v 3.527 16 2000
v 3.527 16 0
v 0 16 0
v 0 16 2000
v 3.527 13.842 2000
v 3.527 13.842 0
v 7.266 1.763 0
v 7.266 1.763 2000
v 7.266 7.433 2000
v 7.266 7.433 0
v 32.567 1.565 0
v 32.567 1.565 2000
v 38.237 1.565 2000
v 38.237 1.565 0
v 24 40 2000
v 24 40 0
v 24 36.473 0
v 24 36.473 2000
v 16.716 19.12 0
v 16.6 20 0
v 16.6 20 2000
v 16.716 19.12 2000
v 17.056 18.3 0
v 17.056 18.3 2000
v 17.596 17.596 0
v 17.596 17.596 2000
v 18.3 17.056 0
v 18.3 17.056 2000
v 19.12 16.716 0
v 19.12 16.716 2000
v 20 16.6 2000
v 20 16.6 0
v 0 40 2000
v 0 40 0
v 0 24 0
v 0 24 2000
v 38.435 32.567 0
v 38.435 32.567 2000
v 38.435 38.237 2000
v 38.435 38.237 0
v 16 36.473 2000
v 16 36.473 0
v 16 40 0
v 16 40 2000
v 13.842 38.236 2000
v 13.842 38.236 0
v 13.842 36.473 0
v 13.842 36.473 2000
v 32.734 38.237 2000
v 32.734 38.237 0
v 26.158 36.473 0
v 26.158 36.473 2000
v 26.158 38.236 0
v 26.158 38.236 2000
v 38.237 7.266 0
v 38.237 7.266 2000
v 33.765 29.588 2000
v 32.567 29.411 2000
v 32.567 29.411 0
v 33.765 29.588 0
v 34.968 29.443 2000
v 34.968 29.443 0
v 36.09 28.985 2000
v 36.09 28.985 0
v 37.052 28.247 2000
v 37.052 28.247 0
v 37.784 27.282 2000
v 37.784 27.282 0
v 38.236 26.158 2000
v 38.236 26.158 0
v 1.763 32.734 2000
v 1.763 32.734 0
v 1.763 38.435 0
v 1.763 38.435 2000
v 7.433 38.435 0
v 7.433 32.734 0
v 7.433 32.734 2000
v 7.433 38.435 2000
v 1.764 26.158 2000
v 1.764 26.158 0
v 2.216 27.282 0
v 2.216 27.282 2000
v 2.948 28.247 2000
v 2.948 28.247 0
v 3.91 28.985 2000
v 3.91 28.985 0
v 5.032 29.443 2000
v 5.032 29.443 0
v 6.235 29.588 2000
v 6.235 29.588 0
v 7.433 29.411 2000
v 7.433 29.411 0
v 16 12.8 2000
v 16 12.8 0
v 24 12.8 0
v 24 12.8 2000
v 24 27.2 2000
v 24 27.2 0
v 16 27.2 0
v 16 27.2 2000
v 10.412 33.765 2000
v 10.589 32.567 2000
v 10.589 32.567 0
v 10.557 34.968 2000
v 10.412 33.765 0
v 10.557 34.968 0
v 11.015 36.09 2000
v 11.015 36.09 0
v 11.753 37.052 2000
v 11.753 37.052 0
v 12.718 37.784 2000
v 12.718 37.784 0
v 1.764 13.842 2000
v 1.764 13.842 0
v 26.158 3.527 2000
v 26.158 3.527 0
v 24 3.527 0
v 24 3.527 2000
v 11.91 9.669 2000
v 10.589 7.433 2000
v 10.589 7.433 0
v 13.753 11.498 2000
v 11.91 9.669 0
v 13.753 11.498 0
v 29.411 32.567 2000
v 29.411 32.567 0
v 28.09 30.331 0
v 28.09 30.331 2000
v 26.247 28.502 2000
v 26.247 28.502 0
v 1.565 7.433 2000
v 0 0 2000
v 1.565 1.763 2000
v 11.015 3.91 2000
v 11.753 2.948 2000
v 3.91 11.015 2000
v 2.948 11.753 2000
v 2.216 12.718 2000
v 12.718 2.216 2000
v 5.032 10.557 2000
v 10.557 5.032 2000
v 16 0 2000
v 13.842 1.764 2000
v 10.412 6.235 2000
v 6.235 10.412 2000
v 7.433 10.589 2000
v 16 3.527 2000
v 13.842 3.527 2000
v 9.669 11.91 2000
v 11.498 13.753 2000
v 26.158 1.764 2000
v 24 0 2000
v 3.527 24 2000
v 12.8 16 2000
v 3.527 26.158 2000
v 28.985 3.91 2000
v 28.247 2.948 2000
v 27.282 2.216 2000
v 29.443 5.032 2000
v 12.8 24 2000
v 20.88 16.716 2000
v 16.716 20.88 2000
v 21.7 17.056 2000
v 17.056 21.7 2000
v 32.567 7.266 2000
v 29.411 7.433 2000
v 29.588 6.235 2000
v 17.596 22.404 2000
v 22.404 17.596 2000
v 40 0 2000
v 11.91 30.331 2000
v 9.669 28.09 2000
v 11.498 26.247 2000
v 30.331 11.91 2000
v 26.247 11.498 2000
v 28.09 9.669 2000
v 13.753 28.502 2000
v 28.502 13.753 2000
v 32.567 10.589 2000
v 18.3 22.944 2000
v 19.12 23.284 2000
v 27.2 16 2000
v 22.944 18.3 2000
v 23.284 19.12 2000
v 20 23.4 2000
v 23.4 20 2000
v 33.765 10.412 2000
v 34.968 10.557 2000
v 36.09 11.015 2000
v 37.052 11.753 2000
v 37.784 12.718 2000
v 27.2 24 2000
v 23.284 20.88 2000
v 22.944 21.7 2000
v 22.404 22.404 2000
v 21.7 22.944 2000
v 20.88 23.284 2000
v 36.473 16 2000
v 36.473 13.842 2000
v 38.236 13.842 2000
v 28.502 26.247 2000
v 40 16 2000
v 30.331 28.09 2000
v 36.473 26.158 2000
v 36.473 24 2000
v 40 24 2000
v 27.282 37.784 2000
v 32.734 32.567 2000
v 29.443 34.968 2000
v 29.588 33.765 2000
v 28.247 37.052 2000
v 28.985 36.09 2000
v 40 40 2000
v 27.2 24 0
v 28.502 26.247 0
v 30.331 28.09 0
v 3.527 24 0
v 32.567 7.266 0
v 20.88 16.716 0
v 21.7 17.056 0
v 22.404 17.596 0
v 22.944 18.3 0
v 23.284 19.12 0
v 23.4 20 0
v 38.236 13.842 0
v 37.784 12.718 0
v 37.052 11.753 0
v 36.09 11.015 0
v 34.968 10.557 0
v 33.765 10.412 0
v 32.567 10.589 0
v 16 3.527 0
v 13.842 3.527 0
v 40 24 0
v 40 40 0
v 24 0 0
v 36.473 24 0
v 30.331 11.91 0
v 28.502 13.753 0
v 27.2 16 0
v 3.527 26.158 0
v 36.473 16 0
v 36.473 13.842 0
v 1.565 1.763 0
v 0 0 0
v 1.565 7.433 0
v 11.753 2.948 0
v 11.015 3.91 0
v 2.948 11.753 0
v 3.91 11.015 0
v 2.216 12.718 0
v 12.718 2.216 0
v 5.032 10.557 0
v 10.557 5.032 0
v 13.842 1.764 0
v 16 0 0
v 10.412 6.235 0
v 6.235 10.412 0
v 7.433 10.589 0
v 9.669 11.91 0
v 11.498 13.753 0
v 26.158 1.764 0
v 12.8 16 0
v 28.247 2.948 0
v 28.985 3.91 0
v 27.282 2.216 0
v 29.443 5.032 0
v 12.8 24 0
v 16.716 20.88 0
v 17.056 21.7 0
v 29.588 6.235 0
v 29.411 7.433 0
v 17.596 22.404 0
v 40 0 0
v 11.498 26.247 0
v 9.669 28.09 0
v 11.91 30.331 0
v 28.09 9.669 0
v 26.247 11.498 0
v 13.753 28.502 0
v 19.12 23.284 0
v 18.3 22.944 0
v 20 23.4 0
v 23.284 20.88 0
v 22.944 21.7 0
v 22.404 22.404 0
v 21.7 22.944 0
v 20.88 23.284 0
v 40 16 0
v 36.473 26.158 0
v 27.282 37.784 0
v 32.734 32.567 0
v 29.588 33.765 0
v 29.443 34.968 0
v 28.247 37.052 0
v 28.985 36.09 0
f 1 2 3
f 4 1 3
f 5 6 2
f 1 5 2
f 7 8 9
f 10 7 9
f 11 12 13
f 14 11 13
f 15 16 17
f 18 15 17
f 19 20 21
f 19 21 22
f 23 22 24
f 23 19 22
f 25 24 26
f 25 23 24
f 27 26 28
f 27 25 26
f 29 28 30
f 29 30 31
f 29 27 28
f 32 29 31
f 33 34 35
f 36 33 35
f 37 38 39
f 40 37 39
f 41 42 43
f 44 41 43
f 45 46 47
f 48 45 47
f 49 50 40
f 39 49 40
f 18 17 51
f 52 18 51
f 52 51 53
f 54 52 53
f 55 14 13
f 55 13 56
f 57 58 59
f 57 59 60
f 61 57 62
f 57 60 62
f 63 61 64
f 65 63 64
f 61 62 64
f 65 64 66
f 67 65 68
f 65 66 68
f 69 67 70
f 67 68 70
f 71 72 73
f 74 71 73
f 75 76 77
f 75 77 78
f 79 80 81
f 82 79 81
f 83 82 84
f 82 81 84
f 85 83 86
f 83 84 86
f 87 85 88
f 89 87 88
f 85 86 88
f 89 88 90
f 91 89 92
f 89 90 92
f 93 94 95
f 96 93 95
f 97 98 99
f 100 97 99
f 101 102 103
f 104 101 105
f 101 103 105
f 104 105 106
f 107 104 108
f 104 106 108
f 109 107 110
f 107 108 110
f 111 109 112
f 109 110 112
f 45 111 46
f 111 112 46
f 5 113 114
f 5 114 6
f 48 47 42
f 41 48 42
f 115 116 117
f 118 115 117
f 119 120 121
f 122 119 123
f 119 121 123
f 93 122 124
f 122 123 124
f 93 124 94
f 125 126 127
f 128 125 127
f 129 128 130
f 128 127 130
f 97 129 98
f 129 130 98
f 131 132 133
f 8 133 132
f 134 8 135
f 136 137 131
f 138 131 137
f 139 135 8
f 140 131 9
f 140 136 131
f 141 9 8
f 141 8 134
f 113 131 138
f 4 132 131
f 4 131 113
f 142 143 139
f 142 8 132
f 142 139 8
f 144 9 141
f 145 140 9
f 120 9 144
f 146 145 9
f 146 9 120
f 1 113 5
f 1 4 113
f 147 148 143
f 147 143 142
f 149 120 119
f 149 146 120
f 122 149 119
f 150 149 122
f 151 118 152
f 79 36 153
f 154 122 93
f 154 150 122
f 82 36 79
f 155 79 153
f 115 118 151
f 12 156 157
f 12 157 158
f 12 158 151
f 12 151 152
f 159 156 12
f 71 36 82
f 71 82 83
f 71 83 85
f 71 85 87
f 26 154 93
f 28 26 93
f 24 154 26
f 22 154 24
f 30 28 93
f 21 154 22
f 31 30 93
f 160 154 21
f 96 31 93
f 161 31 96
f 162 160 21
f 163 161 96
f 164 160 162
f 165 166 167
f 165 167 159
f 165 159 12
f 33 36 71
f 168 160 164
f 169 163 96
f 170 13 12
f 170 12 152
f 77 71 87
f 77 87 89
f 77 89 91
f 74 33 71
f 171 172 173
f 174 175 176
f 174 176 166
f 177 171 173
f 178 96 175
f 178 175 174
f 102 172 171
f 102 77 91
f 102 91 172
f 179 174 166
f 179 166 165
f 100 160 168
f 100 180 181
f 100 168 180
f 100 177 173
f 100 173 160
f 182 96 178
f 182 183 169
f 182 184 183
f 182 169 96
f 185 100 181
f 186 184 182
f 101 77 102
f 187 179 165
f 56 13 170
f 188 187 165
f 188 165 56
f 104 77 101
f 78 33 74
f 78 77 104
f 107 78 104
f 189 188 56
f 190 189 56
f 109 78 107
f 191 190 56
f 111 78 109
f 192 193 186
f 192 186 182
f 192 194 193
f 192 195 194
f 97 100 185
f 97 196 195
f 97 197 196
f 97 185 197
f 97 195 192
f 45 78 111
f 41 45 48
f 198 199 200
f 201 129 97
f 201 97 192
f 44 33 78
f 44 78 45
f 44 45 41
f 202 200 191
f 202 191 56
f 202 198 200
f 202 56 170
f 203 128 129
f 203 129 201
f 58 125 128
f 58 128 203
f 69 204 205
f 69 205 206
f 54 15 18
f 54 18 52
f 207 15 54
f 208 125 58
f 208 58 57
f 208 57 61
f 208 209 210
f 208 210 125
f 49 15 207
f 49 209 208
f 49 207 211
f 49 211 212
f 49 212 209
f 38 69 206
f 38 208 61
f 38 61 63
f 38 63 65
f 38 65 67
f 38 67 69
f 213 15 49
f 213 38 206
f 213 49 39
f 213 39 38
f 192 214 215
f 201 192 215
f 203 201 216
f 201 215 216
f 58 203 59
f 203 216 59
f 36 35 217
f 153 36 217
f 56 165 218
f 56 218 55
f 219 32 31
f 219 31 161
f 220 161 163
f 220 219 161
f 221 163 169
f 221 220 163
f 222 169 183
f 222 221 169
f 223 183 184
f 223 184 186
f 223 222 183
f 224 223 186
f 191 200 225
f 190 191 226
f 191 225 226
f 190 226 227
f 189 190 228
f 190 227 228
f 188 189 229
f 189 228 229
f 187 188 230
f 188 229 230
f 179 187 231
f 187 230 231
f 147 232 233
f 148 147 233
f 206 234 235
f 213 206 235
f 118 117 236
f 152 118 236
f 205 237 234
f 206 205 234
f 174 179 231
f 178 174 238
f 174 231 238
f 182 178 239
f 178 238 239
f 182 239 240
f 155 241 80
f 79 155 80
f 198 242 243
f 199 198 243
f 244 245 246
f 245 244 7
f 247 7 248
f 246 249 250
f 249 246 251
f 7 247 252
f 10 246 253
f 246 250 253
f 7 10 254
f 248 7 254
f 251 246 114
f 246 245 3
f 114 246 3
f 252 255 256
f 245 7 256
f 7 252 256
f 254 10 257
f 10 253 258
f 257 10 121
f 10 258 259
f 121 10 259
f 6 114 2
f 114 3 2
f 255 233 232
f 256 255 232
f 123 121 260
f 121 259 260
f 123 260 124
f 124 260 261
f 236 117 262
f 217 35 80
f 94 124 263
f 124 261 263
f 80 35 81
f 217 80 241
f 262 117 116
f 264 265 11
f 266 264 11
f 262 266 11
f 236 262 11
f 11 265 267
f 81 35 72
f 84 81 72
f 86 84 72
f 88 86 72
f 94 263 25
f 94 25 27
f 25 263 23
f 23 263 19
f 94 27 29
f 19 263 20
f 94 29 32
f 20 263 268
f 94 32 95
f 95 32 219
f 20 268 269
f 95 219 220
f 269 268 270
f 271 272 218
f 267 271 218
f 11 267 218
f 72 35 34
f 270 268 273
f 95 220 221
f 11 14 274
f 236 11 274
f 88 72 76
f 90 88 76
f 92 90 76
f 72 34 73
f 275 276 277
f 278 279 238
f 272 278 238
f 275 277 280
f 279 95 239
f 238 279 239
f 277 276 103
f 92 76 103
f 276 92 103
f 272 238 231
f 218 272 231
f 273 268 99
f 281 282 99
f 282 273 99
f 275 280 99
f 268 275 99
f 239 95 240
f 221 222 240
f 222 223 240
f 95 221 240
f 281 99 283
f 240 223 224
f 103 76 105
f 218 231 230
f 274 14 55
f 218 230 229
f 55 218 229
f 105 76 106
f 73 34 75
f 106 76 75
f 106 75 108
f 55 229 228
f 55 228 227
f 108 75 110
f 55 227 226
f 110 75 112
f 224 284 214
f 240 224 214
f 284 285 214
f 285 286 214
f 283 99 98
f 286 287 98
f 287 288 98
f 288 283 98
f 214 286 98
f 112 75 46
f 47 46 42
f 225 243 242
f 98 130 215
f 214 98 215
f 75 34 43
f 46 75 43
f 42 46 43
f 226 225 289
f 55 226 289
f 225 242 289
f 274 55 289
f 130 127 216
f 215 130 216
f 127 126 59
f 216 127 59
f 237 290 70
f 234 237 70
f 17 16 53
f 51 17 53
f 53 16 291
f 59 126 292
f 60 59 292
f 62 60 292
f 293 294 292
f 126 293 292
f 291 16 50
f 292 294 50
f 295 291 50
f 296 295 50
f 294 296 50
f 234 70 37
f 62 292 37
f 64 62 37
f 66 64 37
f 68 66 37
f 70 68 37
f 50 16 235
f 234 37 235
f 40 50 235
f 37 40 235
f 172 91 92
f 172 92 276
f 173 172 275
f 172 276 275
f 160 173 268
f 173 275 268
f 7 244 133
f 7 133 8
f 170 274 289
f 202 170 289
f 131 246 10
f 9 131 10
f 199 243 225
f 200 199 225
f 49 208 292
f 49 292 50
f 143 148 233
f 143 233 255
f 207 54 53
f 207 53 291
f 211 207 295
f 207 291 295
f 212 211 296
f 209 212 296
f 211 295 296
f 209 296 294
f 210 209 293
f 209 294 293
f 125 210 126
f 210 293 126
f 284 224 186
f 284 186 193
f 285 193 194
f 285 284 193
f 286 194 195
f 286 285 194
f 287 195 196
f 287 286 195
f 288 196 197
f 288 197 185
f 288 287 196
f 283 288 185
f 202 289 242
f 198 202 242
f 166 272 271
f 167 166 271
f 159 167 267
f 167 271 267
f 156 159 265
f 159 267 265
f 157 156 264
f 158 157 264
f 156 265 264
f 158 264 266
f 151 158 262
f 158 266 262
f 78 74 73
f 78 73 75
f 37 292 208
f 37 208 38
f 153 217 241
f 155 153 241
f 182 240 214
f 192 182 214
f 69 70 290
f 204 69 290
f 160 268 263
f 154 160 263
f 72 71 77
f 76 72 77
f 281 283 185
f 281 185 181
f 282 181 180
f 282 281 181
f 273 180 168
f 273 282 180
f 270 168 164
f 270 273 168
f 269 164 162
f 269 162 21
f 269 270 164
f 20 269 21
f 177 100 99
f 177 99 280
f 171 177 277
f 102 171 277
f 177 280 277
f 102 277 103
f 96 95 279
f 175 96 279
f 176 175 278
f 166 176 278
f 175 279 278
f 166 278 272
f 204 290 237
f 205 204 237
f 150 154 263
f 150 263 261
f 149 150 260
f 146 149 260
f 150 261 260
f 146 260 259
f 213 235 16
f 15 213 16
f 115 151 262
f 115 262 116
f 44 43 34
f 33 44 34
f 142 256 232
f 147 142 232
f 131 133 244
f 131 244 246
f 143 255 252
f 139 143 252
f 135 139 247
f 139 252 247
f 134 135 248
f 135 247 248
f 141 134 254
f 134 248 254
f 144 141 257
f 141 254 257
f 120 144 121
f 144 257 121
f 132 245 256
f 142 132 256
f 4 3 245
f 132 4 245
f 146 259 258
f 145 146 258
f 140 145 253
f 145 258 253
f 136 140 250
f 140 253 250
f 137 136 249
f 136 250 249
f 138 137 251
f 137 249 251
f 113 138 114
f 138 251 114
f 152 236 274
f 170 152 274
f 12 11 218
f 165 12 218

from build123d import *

# Parameters (mm, degrees)
CROQUIS1_W              = 5.700927171
CROQUIS1_H              = 5.669703343
CROQUIS1_W_2            = 5.669703343
CROQUIS1_H_2            = 5.700927171
SALIENTE_EXTRUIR1_DEPTH = 2000


with BuildPart() as part:
    # Croquis1 → Saliente-Extruir1 (new body)
    with BuildSketch(Plane.XY):
        with BuildLine():
            Line((16, 0), (16, 3.526999273))
            Line((16, 3.526999273), (13.842037149, 3.526999273))
            Line((13.842037149, 3.526999273), (13.842037149, 1.764099906))
            ThreePointArc((13.842037149, 1.764099906), (11.014894419, 3.909691284), (10.589261103, 7.433202979))
            ThreePointArc((10.589261103, 7.433202979), (12.773071968, 10.642430452), (16, 12.8))
            Line((16, 12.8), (20, 12.8))
            Line((20, 12.8), (24, 12.8))
            ThreePointArc((24, 12.8), (27.226928032, 10.642430452), (29.410738897, 7.433202979))
            ThreePointArc((29.410738897, 7.433202979), (28.985105581, 3.909691284), (26.157962851, 1.764099906))
            Line((26.157962851, 1.764099906), (26.157962851, 3.526999273))
            Line((26.157962851, 3.526999273), (24, 3.526999273))
            Line((24, 3.526999273), (24, 0))
            Line((24, 0), (40, 0))
            Line((40, 0), (40, 16))
            Line((40, 16), (36.473000727, 16))
            Line((36.473000727, 16), (36.473000727, 13.842037149))
            Line((36.473000727, 13.842037149), (38.235900094, 13.842037149))
            ThreePointArc((38.235900094, 13.842037149), (36.090308716, 11.014894419), (32.566797021, 10.589261103))
            ThreePointArc((32.566797021, 10.589261103), (29.357569548, 12.773071968), (27.2, 16))
            Line((27.2, 16), (27.2, 20))
            Line((27.2, 20), (27.2, 24))
            ThreePointArc((27.2, 24), (29.357569548, 27.226928032), (32.566797021, 29.410738897))
            ThreePointArc((32.566797021, 29.410738897), (36.090308716, 28.985105581), (38.235900094, 26.157962851))
            Line((38.235900094, 26.157962851), (36.473000727, 26.157962851))
            Line((36.473000727, 26.157962851), (36.473000727, 24))
            Line((36.473000727, 24), (40, 24))
            Line((40, 24), (40, 40))
            Line((40, 40), (24, 40))
            Line((24, 40), (24, 36.473000727))
            Line((24, 36.473000727), (26.157962851, 36.473000727))
            Line((26.157962851, 36.473000727), (26.157962851, 38.235900094))
            ThreePointArc((26.157962851, 38.235900094), (28.985105581, 36.090308716), (29.410738897, 32.566797021))
            ThreePointArc((29.410738897, 32.566797021), (27.226928032, 29.357569548), (24, 27.2))
            Line((24, 27.2), (20, 27.2))
            Line((20, 27.2), (16, 27.2))
            ThreePointArc((16, 27.2), (12.773071968, 29.357569548), (10.589261103, 32.566797021))
            ThreePointArc((10.589261103, 32.566797021), (11.014894419, 36.090308716), (13.842037149, 38.235900094))
            Line((13.842037149, 38.235900094), (13.842037149, 36.473000727))
            Line((13.842037149, 36.473000727), (16, 36.473000727))
            Line((16, 36.473000727), (16, 40))
            Line((16, 40), (0, 40))
            Line((0, 40), (0, 24))
            Line((0, 24), (3.526999273, 24))
            Line((3.526999273, 24), (3.526999273, 26.157962851))
            Line((3.526999273, 26.157962851), (1.764099906, 26.157962851))
            ThreePointArc((1.764099906, 26.157962851), (3.909691284, 28.985105581), (7.433202979, 29.410738897))
            ThreePointArc((7.433202979, 29.410738897), (10.642430452, 27.226928032), (12.8, 24))
            Line((12.8, 24), (12.8, 20))
            Line((12.8, 20), (12.8, 16))
            ThreePointArc((12.8, 16), (10.642430452, 12.773071968), (7.433202979, 10.589261103))
            ThreePointArc((7.433202979, 10.589261103), (3.909691284, 11.014894419), (1.764099906, 13.842037149))
            Line((1.764099906, 13.842037149), (3.526999273, 13.842037149))
            Line((3.526999273, 13.842037149), (3.526999273, 16))
            Line((3.526999273, 16), (0, 16))
            Line((0, 16), (0, 0))
            Line((0, 0), (16, 0))
        make_face()
        with Locations((4.415111636, 4.598351308)):
            Rectangle(CROQUIS1_W, CROQUIS1_H, mode=Mode.SUBTRACT)
        with Locations((4.598351308, 35.584888365)):
            Rectangle(CROQUIS1_W_2, CROQUIS1_H_2, mode=Mode.SUBTRACT)
        with Locations((35.584888365, 35.401648693)):
            Rectangle(CROQUIS1_W, CROQUIS1_H, mode=Mode.SUBTRACT)
        with Locations((35.401648693, 4.415111636)):
            Rectangle(CROQUIS1_W_2, CROQUIS1_H_2, mode=Mode.SUBTRACT)
        with BuildLine():
            ThreePointArc((16.6, 20), (17.595836944, 17.595836944), (20, 16.6))
            ThreePointArc((20, 16.6), (22.404163056, 17.595836944), (23.4, 20))
            ThreePointArc((23.4, 20), (22.404163056, 22.404163056), (20, 23.4))
            ThreePointArc((20, 23.4), (17.595836944, 22.404163056), (16.6, 20))
        make_face(mode=Mode.SUBTRACT)
    extrude(amount=SALIENTE_EXTRUIR1_DEPTH)


solid = part.part
